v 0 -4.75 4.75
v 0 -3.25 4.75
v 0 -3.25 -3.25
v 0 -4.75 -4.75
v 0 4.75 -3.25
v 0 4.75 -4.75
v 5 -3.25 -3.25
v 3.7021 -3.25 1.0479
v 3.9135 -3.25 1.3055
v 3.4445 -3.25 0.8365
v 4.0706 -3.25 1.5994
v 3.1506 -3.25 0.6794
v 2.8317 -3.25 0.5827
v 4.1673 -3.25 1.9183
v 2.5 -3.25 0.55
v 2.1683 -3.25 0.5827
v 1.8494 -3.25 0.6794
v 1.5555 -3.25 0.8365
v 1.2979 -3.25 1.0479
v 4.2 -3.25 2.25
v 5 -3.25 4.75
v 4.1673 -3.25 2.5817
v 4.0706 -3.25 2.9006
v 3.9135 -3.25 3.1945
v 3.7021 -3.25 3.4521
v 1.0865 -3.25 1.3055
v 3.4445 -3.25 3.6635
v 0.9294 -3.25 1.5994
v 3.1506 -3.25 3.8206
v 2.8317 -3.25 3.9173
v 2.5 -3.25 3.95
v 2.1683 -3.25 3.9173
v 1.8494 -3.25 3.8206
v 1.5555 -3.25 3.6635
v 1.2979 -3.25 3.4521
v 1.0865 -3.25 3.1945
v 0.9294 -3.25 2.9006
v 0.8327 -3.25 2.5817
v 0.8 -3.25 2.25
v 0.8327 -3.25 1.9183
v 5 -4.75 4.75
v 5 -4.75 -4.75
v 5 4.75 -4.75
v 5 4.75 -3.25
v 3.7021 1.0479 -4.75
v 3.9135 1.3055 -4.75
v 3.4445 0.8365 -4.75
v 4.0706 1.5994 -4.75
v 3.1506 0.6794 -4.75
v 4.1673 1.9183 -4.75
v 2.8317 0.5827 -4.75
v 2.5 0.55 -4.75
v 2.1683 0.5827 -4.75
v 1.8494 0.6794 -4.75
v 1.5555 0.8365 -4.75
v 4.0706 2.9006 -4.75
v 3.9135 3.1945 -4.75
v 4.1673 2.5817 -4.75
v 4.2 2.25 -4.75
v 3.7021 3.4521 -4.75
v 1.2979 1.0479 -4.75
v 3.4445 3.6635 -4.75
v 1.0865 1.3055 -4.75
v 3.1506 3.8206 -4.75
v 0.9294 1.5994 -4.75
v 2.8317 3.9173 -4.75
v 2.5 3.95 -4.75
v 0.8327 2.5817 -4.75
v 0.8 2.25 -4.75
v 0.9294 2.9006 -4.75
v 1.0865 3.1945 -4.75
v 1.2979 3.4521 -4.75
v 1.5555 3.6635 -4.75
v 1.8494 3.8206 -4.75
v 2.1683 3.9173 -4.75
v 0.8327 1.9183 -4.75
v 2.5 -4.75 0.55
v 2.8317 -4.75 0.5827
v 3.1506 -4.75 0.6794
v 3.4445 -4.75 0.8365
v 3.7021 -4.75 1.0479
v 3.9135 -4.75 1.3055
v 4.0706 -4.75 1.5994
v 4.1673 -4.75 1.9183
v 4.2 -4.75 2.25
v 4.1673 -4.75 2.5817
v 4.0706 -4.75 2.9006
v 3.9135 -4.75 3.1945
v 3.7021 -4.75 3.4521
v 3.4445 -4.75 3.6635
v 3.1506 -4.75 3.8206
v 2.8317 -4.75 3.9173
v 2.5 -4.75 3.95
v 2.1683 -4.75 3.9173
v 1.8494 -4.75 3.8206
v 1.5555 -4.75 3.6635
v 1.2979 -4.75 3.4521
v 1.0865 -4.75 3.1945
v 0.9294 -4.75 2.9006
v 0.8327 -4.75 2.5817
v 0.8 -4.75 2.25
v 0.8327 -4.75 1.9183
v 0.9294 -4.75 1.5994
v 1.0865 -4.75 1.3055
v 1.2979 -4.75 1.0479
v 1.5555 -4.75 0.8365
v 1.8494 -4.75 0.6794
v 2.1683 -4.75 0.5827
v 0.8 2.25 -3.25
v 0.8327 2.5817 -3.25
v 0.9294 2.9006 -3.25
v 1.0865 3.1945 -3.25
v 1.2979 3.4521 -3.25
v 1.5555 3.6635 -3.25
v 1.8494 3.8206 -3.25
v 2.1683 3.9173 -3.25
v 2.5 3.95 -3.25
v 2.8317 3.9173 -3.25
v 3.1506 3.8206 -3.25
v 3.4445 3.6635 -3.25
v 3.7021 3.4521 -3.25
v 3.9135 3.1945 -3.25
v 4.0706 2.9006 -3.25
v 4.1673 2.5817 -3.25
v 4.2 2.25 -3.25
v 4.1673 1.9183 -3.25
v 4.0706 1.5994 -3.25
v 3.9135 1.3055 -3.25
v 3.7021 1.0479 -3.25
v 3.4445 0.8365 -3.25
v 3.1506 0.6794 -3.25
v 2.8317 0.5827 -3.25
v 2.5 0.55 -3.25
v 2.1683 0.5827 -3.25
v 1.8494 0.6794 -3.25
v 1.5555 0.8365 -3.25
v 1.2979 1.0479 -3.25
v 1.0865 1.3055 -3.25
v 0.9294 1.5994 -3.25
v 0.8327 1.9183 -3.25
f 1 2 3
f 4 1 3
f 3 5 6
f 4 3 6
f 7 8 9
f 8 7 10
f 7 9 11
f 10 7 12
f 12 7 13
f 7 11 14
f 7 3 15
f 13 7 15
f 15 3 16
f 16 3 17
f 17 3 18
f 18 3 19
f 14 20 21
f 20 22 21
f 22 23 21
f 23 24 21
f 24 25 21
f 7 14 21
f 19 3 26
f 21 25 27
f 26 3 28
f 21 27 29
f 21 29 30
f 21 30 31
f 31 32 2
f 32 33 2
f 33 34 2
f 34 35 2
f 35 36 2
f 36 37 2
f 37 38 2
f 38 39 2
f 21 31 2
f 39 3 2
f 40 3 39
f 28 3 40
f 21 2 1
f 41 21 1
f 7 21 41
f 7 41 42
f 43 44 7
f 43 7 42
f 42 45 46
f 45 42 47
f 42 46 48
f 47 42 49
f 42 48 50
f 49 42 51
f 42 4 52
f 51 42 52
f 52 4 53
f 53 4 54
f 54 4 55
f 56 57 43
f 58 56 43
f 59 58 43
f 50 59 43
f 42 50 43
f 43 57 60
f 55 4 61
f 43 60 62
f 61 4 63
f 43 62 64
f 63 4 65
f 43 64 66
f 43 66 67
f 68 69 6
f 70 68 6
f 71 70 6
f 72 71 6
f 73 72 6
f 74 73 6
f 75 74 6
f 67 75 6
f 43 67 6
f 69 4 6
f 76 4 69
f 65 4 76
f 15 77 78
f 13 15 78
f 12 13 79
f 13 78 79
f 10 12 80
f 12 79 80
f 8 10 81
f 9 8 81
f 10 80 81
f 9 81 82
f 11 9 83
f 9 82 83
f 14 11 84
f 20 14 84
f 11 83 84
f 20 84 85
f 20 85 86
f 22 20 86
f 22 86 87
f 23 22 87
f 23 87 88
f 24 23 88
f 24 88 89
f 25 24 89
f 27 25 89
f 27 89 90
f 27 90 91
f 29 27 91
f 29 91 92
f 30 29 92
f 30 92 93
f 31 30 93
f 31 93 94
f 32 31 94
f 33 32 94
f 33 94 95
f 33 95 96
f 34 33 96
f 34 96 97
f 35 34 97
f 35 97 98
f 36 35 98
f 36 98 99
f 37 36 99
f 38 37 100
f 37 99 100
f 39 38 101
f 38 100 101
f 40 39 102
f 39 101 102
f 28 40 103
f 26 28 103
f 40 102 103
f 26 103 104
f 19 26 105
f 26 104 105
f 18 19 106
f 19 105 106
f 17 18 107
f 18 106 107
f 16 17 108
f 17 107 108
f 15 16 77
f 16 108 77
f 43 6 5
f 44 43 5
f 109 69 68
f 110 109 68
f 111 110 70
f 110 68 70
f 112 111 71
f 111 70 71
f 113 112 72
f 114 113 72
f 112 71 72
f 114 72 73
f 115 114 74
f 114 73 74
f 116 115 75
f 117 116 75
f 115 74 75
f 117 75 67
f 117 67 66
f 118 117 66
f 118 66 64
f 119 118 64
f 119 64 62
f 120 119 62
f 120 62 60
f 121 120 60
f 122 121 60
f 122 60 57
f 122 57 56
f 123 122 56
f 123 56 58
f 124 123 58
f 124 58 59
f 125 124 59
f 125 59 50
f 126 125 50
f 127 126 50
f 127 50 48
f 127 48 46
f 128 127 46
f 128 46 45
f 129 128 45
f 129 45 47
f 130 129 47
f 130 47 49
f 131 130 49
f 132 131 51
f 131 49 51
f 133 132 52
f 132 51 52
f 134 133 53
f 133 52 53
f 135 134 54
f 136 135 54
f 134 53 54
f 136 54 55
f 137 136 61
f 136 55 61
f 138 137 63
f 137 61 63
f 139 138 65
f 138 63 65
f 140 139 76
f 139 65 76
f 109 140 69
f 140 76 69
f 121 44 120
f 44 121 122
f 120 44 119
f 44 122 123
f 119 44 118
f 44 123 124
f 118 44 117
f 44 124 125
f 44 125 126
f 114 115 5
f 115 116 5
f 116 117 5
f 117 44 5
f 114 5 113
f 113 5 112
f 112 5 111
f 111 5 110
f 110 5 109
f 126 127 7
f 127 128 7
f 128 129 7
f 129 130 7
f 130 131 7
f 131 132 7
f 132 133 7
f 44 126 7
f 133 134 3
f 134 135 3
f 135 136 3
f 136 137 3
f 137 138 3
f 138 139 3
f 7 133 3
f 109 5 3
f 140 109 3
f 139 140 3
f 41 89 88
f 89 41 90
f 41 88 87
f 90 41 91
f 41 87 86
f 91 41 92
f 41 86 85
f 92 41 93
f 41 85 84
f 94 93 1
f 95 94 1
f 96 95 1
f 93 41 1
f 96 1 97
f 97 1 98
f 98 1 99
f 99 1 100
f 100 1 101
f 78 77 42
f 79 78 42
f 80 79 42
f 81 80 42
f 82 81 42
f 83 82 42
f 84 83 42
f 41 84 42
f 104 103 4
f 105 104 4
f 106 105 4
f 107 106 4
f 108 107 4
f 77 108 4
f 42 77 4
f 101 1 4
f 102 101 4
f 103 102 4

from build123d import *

# Parameters (mm, degrees)
BOSS_EXTRUDE1_DEPTH = 5
SKETCH2_R           = 1.7
CUT_EXTRUDE1_DEPTH  = 12.739356882
SKETCH3_R           = 1.7
CUT_EXTRUDE2_DEPTH  = 12.739356882


with BuildPart() as part:
    # Sketch1 → Boss-Extrude1 (new body)
    with BuildSketch(Plane(origin=(0, 0, 0), x_dir=(0, 0, -1), z_dir=(1, 0, 0))):
        Polygon((-4.75, -3.25), (-4.75, -4.75), (4.75, -4.75), (4.75, 4.75), (3.25, 4.75), (3.25, -3.25), align=None)
    extrude(amount=BOSS_EXTRUDE1_DEPTH)

    # Sketch2 → Cut-Extrude1 (cut, through all)
    with BuildSketch(Plane(origin=(0, 0, -4.75), x_dir=(-1, 0, 0), z_dir=(0, 0, -1))):
        with Locations((-2.5, 2.25)):
            Circle(SKETCH2_R)
    extrude(amount=-CUT_EXTRUDE1_DEPTH, mode=Mode.SUBTRACT)

    # Sketch3 → Cut-Extrude2 (cut, through all)
    with BuildSketch(Plane.XZ.offset(4.75)):
        with Locations(Location((2.5, 2.25, 0), (0, 0, 270))):
            Circle(SKETCH3_R)
    extrude(amount=-CUT_EXTRUDE2_DEPTH, mode=Mode.SUBTRACT)


solid = part.part
